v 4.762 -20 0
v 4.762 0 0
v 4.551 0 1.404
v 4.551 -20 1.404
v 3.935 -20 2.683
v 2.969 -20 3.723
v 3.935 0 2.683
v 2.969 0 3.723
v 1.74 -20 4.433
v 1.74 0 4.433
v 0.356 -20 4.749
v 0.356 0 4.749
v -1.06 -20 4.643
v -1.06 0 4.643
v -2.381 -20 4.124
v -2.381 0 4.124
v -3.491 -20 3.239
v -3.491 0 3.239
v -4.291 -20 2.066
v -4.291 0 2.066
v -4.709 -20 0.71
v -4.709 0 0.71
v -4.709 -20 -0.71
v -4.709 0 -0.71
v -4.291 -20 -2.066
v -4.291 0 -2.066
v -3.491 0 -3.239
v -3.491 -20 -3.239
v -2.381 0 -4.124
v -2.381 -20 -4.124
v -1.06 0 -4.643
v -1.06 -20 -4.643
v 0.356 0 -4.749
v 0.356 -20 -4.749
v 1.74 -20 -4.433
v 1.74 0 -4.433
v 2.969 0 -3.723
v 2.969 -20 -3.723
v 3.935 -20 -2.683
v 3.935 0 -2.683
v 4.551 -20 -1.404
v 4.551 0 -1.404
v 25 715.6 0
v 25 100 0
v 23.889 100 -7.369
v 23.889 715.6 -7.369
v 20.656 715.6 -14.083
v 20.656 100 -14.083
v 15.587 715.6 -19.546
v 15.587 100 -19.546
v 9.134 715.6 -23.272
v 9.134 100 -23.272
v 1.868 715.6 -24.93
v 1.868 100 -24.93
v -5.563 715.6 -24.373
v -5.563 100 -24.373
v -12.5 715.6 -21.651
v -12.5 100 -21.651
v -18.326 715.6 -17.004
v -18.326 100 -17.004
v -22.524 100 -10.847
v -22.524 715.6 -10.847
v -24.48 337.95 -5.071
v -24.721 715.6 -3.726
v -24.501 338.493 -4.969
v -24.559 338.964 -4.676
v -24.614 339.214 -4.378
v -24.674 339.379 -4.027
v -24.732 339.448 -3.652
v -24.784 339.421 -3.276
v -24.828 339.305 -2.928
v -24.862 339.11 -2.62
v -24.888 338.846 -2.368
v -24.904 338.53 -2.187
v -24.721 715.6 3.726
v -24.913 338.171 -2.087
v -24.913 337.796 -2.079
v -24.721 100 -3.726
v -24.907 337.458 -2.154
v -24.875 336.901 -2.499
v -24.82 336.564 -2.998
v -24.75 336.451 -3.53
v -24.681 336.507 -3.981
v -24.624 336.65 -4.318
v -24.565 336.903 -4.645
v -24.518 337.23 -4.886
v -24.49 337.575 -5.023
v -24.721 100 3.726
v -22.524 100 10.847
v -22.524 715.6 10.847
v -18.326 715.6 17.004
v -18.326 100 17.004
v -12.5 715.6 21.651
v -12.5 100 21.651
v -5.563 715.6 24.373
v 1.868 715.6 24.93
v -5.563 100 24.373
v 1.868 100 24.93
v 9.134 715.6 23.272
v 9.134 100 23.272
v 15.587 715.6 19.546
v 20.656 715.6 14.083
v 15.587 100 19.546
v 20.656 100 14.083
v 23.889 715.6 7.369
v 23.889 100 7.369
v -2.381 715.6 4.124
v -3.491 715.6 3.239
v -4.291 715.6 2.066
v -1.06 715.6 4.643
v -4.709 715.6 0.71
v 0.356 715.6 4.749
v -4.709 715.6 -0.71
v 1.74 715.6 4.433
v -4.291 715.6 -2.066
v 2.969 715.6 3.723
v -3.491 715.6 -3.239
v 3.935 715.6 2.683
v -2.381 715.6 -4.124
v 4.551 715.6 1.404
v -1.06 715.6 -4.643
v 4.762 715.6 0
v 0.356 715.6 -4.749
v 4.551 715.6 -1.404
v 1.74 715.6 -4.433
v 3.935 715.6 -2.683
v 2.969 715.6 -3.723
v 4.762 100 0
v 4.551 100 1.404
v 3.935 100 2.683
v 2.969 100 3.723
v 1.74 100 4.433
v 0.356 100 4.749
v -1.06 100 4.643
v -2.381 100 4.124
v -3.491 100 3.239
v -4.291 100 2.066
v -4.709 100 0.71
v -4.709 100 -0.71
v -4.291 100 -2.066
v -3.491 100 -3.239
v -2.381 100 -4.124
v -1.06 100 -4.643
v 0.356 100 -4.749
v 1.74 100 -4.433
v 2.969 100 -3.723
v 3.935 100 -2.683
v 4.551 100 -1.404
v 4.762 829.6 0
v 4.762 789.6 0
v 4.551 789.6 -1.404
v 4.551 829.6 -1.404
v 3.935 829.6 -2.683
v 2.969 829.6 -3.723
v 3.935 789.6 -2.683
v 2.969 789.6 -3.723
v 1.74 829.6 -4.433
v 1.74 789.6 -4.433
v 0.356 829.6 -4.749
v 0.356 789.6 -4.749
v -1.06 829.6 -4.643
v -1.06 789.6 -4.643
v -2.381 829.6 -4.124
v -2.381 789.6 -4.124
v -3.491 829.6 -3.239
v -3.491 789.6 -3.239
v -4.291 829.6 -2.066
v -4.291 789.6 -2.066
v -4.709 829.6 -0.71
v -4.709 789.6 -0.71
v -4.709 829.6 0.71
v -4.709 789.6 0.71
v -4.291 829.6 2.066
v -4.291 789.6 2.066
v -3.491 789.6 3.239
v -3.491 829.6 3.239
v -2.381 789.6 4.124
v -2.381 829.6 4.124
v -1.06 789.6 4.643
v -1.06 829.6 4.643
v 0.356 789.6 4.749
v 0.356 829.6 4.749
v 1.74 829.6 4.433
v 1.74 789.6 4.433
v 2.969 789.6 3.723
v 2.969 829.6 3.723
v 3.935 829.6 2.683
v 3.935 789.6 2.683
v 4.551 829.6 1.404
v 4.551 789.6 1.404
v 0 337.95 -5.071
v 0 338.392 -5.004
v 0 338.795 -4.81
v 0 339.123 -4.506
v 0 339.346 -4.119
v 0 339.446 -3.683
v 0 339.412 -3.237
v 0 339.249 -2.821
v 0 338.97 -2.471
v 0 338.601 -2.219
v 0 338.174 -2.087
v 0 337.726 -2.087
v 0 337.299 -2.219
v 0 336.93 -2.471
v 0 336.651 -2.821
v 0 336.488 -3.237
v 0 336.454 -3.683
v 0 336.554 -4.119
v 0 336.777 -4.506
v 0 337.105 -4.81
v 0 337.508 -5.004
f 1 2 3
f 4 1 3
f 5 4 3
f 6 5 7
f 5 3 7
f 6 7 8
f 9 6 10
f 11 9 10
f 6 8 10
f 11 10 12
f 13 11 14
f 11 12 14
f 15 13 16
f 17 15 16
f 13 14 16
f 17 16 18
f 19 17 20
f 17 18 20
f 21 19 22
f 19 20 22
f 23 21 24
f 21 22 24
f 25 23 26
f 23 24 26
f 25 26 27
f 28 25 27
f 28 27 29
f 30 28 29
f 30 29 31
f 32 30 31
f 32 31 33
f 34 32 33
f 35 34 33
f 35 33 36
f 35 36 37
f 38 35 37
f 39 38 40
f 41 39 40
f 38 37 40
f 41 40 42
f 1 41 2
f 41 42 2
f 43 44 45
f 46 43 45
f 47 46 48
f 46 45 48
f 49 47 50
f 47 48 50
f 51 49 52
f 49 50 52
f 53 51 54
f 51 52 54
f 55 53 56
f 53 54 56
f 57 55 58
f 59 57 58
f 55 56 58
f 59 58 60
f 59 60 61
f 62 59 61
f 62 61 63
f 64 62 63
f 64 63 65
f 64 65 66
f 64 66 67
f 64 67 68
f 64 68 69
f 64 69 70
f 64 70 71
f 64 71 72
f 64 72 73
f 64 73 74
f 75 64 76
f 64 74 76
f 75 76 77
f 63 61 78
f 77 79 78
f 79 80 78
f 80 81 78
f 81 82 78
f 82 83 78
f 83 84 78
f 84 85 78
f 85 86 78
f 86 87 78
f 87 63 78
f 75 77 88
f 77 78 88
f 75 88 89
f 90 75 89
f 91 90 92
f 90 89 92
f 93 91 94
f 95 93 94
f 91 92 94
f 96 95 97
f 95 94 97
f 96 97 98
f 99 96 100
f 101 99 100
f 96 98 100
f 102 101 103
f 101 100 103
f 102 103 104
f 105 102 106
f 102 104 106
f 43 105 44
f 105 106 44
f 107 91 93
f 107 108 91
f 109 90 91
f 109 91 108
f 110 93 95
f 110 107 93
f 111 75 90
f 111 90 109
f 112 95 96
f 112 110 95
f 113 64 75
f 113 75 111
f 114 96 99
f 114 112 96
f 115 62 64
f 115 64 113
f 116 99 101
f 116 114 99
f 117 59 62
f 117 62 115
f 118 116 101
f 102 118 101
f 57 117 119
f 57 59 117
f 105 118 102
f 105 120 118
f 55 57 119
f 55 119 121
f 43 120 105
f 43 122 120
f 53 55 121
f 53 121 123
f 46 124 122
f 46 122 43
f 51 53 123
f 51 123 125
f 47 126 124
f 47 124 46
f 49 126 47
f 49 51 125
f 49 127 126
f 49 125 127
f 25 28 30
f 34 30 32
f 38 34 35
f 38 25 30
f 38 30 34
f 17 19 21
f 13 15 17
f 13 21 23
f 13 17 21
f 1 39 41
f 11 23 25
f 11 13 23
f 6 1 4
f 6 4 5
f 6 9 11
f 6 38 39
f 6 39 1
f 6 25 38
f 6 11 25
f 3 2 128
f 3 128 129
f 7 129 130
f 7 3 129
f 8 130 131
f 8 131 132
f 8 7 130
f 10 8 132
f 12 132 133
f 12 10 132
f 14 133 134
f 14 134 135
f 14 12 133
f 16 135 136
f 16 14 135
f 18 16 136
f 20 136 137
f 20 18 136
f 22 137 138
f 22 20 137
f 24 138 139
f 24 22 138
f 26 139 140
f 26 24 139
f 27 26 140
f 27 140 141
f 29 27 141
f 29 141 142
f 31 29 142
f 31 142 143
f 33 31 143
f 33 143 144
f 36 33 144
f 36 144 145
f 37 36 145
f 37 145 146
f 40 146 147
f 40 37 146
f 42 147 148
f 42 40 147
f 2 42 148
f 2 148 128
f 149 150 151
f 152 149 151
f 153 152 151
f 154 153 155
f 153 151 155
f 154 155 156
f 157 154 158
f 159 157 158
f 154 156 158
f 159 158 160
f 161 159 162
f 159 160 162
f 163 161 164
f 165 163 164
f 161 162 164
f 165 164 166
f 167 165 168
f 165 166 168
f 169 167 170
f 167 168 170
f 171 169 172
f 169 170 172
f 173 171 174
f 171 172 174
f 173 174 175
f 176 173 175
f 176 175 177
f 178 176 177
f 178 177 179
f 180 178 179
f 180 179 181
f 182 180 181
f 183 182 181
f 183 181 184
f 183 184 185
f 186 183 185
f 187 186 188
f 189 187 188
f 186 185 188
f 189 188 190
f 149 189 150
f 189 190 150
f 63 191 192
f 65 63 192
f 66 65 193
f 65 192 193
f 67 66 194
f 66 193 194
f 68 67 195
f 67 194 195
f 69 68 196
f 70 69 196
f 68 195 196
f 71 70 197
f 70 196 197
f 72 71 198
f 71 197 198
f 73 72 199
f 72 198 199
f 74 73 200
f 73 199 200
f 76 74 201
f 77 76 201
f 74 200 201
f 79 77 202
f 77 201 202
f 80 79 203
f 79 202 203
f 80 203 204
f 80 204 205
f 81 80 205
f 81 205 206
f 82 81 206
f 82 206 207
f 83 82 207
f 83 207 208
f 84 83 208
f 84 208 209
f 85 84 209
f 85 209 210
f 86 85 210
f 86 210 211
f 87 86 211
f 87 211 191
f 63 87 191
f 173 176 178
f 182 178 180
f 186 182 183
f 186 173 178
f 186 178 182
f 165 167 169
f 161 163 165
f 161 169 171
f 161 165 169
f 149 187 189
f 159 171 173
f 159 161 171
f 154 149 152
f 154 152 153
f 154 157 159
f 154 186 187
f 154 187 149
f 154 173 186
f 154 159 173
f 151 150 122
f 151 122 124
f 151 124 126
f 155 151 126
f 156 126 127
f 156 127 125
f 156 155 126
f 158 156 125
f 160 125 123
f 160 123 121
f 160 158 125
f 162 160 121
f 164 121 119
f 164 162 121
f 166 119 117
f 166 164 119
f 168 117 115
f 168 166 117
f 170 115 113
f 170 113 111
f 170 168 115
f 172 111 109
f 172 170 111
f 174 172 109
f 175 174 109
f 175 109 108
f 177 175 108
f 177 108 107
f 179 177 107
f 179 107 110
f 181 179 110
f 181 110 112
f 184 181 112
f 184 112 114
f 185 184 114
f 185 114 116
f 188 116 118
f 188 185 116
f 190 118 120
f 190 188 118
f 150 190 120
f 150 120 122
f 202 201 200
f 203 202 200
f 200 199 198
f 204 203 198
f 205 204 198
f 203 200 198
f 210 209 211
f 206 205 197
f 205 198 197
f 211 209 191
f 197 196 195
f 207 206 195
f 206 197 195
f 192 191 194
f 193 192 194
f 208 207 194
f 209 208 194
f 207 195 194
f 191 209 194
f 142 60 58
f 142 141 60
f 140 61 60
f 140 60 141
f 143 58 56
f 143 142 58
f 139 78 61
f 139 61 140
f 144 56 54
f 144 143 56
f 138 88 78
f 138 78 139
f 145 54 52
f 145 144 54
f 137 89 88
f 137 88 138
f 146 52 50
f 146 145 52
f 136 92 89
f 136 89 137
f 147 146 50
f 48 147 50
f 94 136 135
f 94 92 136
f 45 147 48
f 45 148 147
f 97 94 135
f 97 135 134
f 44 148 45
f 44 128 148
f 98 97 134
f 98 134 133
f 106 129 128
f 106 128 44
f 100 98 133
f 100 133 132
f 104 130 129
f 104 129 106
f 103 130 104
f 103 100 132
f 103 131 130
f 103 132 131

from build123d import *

# Parameters (mm, degrees)
SKETCH1_R           = 25
BOSS_EXTRUDE1_DEPTH = 789.6
SKETCH2_R           = 25
SKETCH2_R_2         = 4.7625
CUT_EXTRUDE1_DEPTH  = 74
SKETCH3_R           = 25
SKETCH3_R_2         = 4.7625
CUT_EXTRUDE2_DEPTH  = 100
SKETCH4_R           = 1.5
CUT_EXTRUDE3_DEPTH  = 30
SKETCH5_R           = 4.7625
BOSS_EXTRUDE3_DEPTH = 20
SKETCH6_R           = 4.7625
BOSS_EXTRUDE4_DEPTH = 40


with BuildPart() as part:
    # Sketch1 → Boss-Extrude1 (new body)
    with BuildSketch(Plane(origin=(0, 0, 0), x_dir=(1, 0, 0), z_dir=(0, 1, 0))):
        Circle(SKETCH1_R)
    extrude(amount=BOSS_EXTRUDE1_DEPTH)

    # Sketch2 → Cut-Extrude1 (cut)
    with BuildSketch(Plane(origin=(0, 789.6, 0), x_dir=(1, 0, 0), z_dir=(0, 1, 0))):
        Circle(SKETCH2_R)
        Circle(SKETCH2_R_2, mode=Mode.SUBTRACT)
    extrude(amount=-CUT_EXTRUDE1_DEPTH, mode=Mode.SUBTRACT)

    # Sketch3 → Cut-Extrude2 (cut)
    with BuildSketch(Plane.XZ):
        Circle(SKETCH3_R)
        Circle(SKETCH3_R_2, mode=Mode.SUBTRACT)
    extrude(amount=-CUT_EXTRUDE2_DEPTH, mode=Mode.SUBTRACT)

    # Sketch4 → Cut-Extrude3 (cut)
    with BuildSketch(Plane(origin=(0, 0, 0), x_dir=(0, 0, -1), z_dir=(1, 0, 0))):
        with Locations((3.570652979, 337.95)):
            Circle(SKETCH4_R)
    extrude(amount=-CUT_EXTRUDE3_DEPTH, mode=Mode.SUBTRACT)

    # Sketch5 → Boss-Extrude3 (add)
    with BuildSketch(Plane.XZ):
        Circle(SKETCH5_R)
    extrude(amount=BOSS_EXTRUDE3_DEPTH)

    # Sketch6 → Boss-Extrude4 (add)
    with BuildSketch(Plane(origin=(0, 789.6, 0), x_dir=(1, 0, 0), z_dir=(0, 1, 0))):
        Circle(SKETCH6_R)
    extrude(amount=BOSS_EXTRUDE4_DEPTH)


solid = part.part
